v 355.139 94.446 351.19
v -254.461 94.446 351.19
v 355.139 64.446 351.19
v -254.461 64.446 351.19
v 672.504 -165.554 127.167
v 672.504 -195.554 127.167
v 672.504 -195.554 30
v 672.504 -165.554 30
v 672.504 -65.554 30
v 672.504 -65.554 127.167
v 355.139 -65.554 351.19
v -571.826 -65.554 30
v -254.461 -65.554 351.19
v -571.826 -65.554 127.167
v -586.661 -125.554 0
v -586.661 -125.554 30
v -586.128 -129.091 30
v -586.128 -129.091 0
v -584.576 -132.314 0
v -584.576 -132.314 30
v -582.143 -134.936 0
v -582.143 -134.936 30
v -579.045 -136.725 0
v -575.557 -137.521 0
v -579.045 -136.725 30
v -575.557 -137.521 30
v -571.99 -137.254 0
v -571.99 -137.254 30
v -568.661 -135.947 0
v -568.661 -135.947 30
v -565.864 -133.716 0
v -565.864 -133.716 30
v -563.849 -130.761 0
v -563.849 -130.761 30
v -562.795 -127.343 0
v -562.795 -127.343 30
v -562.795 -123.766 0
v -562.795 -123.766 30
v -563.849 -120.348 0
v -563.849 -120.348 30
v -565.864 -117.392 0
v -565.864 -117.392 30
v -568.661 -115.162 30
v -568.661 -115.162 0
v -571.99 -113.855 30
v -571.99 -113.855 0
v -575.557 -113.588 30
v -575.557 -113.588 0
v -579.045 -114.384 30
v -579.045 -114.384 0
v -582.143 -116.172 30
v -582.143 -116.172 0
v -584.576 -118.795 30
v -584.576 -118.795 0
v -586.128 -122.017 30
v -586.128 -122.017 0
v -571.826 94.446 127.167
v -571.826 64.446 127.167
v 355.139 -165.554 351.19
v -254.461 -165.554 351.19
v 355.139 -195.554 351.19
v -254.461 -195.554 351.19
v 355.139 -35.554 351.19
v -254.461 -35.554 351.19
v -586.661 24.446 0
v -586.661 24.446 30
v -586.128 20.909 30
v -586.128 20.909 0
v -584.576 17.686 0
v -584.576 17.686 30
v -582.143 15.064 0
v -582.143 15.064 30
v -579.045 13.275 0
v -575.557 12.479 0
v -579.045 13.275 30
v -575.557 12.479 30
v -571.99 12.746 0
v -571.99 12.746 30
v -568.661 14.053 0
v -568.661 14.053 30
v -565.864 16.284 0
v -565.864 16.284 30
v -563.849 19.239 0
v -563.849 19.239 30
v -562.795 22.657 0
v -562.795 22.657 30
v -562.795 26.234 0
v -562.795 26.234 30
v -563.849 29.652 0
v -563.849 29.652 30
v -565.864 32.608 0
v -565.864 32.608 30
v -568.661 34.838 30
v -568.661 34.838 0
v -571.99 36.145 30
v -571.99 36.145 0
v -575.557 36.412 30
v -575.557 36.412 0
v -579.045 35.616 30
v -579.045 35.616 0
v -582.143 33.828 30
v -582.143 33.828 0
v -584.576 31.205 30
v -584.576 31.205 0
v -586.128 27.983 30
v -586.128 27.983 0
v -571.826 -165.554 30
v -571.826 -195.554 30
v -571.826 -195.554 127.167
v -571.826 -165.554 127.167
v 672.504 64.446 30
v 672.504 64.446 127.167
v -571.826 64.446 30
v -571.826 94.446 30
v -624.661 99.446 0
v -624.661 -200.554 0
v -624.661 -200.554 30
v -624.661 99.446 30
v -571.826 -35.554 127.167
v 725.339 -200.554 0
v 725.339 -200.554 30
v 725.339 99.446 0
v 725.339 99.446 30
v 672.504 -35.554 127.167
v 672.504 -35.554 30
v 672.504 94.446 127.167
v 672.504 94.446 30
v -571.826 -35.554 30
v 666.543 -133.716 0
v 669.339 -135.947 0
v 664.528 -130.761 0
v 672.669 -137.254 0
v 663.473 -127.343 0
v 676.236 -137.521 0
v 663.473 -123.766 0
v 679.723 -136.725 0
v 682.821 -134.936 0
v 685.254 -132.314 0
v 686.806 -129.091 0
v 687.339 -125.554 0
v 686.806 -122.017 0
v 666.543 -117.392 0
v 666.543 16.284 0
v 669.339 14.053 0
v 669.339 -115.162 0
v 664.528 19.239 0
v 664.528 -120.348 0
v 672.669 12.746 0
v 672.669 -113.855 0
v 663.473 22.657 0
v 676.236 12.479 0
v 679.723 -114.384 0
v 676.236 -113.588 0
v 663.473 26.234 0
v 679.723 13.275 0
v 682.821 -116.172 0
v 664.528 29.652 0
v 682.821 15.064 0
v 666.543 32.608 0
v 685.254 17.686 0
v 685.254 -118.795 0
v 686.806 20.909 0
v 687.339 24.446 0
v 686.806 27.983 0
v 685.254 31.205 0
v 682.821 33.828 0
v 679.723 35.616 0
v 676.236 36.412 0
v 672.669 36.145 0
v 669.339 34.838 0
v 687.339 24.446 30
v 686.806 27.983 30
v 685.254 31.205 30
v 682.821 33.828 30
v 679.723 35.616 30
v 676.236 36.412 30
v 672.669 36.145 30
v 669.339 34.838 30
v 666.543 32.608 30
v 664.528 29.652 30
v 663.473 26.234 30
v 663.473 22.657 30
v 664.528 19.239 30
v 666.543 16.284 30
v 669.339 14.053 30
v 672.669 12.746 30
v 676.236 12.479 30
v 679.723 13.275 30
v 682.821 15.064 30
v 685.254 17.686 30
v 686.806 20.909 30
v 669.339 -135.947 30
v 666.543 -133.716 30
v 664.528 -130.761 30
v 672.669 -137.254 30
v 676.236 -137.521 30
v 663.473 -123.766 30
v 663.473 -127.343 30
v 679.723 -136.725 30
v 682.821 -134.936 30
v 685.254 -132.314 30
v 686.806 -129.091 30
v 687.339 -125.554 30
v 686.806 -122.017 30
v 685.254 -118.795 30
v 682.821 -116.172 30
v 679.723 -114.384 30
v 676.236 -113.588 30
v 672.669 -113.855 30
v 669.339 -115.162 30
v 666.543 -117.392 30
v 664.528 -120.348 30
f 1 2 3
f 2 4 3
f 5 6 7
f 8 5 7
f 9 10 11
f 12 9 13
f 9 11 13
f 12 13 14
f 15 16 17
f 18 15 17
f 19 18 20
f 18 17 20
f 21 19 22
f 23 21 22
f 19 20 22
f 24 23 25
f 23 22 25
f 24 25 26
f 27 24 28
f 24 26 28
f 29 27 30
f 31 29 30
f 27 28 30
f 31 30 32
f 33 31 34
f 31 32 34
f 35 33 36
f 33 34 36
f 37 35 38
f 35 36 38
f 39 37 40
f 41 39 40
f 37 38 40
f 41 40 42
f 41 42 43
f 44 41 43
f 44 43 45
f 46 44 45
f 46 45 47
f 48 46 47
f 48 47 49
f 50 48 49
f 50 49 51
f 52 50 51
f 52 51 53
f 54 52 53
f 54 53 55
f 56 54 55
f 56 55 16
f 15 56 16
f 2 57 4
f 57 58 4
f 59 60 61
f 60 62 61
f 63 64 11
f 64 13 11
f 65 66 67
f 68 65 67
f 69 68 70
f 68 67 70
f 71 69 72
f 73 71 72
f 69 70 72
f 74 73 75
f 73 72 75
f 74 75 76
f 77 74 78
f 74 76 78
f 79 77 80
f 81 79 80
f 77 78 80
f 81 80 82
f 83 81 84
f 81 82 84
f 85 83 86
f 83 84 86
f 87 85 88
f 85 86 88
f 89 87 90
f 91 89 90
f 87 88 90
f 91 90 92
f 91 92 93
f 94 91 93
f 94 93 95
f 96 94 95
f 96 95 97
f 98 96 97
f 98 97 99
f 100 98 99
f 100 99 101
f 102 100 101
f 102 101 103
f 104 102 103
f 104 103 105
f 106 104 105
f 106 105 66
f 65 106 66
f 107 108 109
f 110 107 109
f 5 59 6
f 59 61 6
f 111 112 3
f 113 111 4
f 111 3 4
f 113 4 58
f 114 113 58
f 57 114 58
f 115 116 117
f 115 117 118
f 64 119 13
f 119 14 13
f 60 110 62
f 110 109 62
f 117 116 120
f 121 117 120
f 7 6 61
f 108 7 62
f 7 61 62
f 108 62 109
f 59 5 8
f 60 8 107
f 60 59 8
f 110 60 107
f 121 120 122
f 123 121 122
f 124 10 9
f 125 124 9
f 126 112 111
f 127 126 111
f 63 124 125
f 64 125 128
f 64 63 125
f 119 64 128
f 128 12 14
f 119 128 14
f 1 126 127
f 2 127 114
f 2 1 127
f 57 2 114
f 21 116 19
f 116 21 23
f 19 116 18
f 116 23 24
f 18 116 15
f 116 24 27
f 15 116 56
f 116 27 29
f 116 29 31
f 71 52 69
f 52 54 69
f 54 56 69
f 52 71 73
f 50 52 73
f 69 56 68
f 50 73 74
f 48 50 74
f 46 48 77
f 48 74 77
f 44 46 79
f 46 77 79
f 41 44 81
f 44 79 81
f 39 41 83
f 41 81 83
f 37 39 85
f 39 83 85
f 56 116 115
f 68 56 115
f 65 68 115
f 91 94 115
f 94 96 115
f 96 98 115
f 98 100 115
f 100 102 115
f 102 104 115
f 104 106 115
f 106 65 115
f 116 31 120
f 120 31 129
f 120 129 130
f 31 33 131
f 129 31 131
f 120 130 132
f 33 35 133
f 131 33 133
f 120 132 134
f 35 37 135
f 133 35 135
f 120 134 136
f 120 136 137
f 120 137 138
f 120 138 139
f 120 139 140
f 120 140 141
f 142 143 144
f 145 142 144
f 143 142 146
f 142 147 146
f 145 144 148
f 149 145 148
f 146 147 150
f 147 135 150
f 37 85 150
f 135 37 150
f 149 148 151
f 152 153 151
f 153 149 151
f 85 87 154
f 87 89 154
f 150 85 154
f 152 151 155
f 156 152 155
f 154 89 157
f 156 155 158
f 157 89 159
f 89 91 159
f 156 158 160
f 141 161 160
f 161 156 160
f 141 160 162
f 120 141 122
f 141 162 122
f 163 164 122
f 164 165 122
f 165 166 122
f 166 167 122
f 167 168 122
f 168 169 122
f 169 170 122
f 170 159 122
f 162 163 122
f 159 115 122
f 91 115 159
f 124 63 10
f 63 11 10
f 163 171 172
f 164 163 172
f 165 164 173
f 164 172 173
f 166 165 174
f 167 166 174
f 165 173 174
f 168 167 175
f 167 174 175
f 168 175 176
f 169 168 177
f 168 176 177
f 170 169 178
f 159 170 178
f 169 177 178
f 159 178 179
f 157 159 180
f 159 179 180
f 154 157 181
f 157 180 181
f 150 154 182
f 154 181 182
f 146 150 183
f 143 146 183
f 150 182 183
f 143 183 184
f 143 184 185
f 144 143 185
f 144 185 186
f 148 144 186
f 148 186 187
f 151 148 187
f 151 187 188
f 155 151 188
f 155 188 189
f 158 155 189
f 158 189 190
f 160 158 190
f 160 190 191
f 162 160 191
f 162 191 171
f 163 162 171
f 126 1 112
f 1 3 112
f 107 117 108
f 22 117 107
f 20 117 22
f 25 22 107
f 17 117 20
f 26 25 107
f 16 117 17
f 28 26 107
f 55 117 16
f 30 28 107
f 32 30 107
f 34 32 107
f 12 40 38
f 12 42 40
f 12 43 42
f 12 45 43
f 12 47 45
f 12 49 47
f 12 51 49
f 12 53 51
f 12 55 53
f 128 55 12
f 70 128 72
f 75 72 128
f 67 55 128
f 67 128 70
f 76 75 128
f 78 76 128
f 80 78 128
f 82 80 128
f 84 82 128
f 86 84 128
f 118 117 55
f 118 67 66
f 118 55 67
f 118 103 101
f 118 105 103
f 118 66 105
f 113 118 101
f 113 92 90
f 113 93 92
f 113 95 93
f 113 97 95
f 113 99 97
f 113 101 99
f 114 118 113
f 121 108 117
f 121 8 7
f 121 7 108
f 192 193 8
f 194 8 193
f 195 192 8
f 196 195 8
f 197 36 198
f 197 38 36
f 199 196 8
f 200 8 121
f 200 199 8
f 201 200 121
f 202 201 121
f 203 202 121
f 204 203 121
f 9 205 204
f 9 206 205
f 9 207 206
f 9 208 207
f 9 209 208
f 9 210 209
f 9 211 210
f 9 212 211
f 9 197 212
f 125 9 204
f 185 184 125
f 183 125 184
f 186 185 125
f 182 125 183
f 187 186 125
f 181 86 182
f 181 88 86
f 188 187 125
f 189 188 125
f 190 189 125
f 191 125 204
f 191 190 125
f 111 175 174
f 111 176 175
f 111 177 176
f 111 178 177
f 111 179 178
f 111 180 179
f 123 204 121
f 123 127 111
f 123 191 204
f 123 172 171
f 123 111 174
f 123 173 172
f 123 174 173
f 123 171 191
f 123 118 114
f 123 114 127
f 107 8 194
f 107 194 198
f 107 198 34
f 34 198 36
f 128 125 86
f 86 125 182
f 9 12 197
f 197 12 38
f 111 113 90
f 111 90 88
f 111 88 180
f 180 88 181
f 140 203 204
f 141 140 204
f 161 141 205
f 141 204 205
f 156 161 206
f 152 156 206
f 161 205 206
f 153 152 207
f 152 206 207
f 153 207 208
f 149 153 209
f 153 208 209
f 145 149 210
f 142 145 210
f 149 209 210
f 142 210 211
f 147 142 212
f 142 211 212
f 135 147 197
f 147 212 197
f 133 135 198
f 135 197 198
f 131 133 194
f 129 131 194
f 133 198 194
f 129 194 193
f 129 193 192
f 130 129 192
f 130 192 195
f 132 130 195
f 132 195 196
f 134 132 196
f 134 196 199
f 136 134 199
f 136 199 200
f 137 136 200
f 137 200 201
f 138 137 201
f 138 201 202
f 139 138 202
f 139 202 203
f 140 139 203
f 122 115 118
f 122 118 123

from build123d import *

# Parameters (mm, degrees)
SKETCH1_W           = 1350
SKETCH1_H           = 300
EXTRUDE1_DEPTH      = 30
SKETCH2_R           = 12
CUT_EXTRUDE1_DEPTH  = 31
EXTRUDE2_DEPTH      = 15
LPATTERN1_COUNT     = 2
LPATTERN1_PITCH     = 130
LPATTERN1_COL_COUNT = 2
LPATTERN1_COL_PITCH = 130


with BuildPart() as part:
    # Sketch1 → Extrude1 (new body)
    with BuildSketch(Plane.XY):
        with Locations((50.339261683, -50.554392858)):
            Rectangle(SKETCH1_W, SKETCH1_H)
    extrude(amount=EXTRUDE1_DEPTH)

    # Sketch2 → Cut-Extrude1 (cut, through all)
    with BuildSketch(Plane.XY.offset(30)):
        with Locations((675.339261683, 24.445607142)):
            Circle(SKETCH2_R)
        with Locations((675.339261683, -125.554392858)):
            Circle(SKETCH2_R)
        with Locations(Location((-574.660738317, -125.554392858, 0), (0, 0, 180))):  # turned: the seam where the file's is
            Circle(SKETCH2_R)
        with Locations(Location((-574.660738317, 24.445607142, 0), (0, 0, 180))):  # turned: the seam where the file's is
            Circle(SKETCH2_R)
    extrude(amount=-CUT_EXTRUDE1_DEPTH, mode=Mode.SUBTRACT)

    # Sketch3 → Extrude2 (add, symmetric)
    with BuildSketch(Plane(origin=(-624.660738317, -50.554392858, 0), x_dir=(1, 0, 0), z_dir=(0, -1, 0))):
        Polygon((52.834900275, 30), (52.834900275, 127.16727695), (370.2, 351.189991199), (979.8, 351.189991199), (1297.165099725, 127.16727695), (1297.165099725, 30), align=None)
    extrude2 = extrude(amount=EXTRUDE2_DEPTH, both=True)

    # LPattern1: Extrude2 ×2
    with Locations(*[(0, -i * LPATTERN1_PITCH, 0) for i in range(1, LPATTERN1_COUNT)]):
        add(extrude2)

    # LPattern1 col: Extrude2 ×2
    with Locations(*[(0, i * LPATTERN1_COL_PITCH, 0) for i in range(1, LPATTERN1_COL_COUNT)]):
        add(extrude2)


solid = part.part
